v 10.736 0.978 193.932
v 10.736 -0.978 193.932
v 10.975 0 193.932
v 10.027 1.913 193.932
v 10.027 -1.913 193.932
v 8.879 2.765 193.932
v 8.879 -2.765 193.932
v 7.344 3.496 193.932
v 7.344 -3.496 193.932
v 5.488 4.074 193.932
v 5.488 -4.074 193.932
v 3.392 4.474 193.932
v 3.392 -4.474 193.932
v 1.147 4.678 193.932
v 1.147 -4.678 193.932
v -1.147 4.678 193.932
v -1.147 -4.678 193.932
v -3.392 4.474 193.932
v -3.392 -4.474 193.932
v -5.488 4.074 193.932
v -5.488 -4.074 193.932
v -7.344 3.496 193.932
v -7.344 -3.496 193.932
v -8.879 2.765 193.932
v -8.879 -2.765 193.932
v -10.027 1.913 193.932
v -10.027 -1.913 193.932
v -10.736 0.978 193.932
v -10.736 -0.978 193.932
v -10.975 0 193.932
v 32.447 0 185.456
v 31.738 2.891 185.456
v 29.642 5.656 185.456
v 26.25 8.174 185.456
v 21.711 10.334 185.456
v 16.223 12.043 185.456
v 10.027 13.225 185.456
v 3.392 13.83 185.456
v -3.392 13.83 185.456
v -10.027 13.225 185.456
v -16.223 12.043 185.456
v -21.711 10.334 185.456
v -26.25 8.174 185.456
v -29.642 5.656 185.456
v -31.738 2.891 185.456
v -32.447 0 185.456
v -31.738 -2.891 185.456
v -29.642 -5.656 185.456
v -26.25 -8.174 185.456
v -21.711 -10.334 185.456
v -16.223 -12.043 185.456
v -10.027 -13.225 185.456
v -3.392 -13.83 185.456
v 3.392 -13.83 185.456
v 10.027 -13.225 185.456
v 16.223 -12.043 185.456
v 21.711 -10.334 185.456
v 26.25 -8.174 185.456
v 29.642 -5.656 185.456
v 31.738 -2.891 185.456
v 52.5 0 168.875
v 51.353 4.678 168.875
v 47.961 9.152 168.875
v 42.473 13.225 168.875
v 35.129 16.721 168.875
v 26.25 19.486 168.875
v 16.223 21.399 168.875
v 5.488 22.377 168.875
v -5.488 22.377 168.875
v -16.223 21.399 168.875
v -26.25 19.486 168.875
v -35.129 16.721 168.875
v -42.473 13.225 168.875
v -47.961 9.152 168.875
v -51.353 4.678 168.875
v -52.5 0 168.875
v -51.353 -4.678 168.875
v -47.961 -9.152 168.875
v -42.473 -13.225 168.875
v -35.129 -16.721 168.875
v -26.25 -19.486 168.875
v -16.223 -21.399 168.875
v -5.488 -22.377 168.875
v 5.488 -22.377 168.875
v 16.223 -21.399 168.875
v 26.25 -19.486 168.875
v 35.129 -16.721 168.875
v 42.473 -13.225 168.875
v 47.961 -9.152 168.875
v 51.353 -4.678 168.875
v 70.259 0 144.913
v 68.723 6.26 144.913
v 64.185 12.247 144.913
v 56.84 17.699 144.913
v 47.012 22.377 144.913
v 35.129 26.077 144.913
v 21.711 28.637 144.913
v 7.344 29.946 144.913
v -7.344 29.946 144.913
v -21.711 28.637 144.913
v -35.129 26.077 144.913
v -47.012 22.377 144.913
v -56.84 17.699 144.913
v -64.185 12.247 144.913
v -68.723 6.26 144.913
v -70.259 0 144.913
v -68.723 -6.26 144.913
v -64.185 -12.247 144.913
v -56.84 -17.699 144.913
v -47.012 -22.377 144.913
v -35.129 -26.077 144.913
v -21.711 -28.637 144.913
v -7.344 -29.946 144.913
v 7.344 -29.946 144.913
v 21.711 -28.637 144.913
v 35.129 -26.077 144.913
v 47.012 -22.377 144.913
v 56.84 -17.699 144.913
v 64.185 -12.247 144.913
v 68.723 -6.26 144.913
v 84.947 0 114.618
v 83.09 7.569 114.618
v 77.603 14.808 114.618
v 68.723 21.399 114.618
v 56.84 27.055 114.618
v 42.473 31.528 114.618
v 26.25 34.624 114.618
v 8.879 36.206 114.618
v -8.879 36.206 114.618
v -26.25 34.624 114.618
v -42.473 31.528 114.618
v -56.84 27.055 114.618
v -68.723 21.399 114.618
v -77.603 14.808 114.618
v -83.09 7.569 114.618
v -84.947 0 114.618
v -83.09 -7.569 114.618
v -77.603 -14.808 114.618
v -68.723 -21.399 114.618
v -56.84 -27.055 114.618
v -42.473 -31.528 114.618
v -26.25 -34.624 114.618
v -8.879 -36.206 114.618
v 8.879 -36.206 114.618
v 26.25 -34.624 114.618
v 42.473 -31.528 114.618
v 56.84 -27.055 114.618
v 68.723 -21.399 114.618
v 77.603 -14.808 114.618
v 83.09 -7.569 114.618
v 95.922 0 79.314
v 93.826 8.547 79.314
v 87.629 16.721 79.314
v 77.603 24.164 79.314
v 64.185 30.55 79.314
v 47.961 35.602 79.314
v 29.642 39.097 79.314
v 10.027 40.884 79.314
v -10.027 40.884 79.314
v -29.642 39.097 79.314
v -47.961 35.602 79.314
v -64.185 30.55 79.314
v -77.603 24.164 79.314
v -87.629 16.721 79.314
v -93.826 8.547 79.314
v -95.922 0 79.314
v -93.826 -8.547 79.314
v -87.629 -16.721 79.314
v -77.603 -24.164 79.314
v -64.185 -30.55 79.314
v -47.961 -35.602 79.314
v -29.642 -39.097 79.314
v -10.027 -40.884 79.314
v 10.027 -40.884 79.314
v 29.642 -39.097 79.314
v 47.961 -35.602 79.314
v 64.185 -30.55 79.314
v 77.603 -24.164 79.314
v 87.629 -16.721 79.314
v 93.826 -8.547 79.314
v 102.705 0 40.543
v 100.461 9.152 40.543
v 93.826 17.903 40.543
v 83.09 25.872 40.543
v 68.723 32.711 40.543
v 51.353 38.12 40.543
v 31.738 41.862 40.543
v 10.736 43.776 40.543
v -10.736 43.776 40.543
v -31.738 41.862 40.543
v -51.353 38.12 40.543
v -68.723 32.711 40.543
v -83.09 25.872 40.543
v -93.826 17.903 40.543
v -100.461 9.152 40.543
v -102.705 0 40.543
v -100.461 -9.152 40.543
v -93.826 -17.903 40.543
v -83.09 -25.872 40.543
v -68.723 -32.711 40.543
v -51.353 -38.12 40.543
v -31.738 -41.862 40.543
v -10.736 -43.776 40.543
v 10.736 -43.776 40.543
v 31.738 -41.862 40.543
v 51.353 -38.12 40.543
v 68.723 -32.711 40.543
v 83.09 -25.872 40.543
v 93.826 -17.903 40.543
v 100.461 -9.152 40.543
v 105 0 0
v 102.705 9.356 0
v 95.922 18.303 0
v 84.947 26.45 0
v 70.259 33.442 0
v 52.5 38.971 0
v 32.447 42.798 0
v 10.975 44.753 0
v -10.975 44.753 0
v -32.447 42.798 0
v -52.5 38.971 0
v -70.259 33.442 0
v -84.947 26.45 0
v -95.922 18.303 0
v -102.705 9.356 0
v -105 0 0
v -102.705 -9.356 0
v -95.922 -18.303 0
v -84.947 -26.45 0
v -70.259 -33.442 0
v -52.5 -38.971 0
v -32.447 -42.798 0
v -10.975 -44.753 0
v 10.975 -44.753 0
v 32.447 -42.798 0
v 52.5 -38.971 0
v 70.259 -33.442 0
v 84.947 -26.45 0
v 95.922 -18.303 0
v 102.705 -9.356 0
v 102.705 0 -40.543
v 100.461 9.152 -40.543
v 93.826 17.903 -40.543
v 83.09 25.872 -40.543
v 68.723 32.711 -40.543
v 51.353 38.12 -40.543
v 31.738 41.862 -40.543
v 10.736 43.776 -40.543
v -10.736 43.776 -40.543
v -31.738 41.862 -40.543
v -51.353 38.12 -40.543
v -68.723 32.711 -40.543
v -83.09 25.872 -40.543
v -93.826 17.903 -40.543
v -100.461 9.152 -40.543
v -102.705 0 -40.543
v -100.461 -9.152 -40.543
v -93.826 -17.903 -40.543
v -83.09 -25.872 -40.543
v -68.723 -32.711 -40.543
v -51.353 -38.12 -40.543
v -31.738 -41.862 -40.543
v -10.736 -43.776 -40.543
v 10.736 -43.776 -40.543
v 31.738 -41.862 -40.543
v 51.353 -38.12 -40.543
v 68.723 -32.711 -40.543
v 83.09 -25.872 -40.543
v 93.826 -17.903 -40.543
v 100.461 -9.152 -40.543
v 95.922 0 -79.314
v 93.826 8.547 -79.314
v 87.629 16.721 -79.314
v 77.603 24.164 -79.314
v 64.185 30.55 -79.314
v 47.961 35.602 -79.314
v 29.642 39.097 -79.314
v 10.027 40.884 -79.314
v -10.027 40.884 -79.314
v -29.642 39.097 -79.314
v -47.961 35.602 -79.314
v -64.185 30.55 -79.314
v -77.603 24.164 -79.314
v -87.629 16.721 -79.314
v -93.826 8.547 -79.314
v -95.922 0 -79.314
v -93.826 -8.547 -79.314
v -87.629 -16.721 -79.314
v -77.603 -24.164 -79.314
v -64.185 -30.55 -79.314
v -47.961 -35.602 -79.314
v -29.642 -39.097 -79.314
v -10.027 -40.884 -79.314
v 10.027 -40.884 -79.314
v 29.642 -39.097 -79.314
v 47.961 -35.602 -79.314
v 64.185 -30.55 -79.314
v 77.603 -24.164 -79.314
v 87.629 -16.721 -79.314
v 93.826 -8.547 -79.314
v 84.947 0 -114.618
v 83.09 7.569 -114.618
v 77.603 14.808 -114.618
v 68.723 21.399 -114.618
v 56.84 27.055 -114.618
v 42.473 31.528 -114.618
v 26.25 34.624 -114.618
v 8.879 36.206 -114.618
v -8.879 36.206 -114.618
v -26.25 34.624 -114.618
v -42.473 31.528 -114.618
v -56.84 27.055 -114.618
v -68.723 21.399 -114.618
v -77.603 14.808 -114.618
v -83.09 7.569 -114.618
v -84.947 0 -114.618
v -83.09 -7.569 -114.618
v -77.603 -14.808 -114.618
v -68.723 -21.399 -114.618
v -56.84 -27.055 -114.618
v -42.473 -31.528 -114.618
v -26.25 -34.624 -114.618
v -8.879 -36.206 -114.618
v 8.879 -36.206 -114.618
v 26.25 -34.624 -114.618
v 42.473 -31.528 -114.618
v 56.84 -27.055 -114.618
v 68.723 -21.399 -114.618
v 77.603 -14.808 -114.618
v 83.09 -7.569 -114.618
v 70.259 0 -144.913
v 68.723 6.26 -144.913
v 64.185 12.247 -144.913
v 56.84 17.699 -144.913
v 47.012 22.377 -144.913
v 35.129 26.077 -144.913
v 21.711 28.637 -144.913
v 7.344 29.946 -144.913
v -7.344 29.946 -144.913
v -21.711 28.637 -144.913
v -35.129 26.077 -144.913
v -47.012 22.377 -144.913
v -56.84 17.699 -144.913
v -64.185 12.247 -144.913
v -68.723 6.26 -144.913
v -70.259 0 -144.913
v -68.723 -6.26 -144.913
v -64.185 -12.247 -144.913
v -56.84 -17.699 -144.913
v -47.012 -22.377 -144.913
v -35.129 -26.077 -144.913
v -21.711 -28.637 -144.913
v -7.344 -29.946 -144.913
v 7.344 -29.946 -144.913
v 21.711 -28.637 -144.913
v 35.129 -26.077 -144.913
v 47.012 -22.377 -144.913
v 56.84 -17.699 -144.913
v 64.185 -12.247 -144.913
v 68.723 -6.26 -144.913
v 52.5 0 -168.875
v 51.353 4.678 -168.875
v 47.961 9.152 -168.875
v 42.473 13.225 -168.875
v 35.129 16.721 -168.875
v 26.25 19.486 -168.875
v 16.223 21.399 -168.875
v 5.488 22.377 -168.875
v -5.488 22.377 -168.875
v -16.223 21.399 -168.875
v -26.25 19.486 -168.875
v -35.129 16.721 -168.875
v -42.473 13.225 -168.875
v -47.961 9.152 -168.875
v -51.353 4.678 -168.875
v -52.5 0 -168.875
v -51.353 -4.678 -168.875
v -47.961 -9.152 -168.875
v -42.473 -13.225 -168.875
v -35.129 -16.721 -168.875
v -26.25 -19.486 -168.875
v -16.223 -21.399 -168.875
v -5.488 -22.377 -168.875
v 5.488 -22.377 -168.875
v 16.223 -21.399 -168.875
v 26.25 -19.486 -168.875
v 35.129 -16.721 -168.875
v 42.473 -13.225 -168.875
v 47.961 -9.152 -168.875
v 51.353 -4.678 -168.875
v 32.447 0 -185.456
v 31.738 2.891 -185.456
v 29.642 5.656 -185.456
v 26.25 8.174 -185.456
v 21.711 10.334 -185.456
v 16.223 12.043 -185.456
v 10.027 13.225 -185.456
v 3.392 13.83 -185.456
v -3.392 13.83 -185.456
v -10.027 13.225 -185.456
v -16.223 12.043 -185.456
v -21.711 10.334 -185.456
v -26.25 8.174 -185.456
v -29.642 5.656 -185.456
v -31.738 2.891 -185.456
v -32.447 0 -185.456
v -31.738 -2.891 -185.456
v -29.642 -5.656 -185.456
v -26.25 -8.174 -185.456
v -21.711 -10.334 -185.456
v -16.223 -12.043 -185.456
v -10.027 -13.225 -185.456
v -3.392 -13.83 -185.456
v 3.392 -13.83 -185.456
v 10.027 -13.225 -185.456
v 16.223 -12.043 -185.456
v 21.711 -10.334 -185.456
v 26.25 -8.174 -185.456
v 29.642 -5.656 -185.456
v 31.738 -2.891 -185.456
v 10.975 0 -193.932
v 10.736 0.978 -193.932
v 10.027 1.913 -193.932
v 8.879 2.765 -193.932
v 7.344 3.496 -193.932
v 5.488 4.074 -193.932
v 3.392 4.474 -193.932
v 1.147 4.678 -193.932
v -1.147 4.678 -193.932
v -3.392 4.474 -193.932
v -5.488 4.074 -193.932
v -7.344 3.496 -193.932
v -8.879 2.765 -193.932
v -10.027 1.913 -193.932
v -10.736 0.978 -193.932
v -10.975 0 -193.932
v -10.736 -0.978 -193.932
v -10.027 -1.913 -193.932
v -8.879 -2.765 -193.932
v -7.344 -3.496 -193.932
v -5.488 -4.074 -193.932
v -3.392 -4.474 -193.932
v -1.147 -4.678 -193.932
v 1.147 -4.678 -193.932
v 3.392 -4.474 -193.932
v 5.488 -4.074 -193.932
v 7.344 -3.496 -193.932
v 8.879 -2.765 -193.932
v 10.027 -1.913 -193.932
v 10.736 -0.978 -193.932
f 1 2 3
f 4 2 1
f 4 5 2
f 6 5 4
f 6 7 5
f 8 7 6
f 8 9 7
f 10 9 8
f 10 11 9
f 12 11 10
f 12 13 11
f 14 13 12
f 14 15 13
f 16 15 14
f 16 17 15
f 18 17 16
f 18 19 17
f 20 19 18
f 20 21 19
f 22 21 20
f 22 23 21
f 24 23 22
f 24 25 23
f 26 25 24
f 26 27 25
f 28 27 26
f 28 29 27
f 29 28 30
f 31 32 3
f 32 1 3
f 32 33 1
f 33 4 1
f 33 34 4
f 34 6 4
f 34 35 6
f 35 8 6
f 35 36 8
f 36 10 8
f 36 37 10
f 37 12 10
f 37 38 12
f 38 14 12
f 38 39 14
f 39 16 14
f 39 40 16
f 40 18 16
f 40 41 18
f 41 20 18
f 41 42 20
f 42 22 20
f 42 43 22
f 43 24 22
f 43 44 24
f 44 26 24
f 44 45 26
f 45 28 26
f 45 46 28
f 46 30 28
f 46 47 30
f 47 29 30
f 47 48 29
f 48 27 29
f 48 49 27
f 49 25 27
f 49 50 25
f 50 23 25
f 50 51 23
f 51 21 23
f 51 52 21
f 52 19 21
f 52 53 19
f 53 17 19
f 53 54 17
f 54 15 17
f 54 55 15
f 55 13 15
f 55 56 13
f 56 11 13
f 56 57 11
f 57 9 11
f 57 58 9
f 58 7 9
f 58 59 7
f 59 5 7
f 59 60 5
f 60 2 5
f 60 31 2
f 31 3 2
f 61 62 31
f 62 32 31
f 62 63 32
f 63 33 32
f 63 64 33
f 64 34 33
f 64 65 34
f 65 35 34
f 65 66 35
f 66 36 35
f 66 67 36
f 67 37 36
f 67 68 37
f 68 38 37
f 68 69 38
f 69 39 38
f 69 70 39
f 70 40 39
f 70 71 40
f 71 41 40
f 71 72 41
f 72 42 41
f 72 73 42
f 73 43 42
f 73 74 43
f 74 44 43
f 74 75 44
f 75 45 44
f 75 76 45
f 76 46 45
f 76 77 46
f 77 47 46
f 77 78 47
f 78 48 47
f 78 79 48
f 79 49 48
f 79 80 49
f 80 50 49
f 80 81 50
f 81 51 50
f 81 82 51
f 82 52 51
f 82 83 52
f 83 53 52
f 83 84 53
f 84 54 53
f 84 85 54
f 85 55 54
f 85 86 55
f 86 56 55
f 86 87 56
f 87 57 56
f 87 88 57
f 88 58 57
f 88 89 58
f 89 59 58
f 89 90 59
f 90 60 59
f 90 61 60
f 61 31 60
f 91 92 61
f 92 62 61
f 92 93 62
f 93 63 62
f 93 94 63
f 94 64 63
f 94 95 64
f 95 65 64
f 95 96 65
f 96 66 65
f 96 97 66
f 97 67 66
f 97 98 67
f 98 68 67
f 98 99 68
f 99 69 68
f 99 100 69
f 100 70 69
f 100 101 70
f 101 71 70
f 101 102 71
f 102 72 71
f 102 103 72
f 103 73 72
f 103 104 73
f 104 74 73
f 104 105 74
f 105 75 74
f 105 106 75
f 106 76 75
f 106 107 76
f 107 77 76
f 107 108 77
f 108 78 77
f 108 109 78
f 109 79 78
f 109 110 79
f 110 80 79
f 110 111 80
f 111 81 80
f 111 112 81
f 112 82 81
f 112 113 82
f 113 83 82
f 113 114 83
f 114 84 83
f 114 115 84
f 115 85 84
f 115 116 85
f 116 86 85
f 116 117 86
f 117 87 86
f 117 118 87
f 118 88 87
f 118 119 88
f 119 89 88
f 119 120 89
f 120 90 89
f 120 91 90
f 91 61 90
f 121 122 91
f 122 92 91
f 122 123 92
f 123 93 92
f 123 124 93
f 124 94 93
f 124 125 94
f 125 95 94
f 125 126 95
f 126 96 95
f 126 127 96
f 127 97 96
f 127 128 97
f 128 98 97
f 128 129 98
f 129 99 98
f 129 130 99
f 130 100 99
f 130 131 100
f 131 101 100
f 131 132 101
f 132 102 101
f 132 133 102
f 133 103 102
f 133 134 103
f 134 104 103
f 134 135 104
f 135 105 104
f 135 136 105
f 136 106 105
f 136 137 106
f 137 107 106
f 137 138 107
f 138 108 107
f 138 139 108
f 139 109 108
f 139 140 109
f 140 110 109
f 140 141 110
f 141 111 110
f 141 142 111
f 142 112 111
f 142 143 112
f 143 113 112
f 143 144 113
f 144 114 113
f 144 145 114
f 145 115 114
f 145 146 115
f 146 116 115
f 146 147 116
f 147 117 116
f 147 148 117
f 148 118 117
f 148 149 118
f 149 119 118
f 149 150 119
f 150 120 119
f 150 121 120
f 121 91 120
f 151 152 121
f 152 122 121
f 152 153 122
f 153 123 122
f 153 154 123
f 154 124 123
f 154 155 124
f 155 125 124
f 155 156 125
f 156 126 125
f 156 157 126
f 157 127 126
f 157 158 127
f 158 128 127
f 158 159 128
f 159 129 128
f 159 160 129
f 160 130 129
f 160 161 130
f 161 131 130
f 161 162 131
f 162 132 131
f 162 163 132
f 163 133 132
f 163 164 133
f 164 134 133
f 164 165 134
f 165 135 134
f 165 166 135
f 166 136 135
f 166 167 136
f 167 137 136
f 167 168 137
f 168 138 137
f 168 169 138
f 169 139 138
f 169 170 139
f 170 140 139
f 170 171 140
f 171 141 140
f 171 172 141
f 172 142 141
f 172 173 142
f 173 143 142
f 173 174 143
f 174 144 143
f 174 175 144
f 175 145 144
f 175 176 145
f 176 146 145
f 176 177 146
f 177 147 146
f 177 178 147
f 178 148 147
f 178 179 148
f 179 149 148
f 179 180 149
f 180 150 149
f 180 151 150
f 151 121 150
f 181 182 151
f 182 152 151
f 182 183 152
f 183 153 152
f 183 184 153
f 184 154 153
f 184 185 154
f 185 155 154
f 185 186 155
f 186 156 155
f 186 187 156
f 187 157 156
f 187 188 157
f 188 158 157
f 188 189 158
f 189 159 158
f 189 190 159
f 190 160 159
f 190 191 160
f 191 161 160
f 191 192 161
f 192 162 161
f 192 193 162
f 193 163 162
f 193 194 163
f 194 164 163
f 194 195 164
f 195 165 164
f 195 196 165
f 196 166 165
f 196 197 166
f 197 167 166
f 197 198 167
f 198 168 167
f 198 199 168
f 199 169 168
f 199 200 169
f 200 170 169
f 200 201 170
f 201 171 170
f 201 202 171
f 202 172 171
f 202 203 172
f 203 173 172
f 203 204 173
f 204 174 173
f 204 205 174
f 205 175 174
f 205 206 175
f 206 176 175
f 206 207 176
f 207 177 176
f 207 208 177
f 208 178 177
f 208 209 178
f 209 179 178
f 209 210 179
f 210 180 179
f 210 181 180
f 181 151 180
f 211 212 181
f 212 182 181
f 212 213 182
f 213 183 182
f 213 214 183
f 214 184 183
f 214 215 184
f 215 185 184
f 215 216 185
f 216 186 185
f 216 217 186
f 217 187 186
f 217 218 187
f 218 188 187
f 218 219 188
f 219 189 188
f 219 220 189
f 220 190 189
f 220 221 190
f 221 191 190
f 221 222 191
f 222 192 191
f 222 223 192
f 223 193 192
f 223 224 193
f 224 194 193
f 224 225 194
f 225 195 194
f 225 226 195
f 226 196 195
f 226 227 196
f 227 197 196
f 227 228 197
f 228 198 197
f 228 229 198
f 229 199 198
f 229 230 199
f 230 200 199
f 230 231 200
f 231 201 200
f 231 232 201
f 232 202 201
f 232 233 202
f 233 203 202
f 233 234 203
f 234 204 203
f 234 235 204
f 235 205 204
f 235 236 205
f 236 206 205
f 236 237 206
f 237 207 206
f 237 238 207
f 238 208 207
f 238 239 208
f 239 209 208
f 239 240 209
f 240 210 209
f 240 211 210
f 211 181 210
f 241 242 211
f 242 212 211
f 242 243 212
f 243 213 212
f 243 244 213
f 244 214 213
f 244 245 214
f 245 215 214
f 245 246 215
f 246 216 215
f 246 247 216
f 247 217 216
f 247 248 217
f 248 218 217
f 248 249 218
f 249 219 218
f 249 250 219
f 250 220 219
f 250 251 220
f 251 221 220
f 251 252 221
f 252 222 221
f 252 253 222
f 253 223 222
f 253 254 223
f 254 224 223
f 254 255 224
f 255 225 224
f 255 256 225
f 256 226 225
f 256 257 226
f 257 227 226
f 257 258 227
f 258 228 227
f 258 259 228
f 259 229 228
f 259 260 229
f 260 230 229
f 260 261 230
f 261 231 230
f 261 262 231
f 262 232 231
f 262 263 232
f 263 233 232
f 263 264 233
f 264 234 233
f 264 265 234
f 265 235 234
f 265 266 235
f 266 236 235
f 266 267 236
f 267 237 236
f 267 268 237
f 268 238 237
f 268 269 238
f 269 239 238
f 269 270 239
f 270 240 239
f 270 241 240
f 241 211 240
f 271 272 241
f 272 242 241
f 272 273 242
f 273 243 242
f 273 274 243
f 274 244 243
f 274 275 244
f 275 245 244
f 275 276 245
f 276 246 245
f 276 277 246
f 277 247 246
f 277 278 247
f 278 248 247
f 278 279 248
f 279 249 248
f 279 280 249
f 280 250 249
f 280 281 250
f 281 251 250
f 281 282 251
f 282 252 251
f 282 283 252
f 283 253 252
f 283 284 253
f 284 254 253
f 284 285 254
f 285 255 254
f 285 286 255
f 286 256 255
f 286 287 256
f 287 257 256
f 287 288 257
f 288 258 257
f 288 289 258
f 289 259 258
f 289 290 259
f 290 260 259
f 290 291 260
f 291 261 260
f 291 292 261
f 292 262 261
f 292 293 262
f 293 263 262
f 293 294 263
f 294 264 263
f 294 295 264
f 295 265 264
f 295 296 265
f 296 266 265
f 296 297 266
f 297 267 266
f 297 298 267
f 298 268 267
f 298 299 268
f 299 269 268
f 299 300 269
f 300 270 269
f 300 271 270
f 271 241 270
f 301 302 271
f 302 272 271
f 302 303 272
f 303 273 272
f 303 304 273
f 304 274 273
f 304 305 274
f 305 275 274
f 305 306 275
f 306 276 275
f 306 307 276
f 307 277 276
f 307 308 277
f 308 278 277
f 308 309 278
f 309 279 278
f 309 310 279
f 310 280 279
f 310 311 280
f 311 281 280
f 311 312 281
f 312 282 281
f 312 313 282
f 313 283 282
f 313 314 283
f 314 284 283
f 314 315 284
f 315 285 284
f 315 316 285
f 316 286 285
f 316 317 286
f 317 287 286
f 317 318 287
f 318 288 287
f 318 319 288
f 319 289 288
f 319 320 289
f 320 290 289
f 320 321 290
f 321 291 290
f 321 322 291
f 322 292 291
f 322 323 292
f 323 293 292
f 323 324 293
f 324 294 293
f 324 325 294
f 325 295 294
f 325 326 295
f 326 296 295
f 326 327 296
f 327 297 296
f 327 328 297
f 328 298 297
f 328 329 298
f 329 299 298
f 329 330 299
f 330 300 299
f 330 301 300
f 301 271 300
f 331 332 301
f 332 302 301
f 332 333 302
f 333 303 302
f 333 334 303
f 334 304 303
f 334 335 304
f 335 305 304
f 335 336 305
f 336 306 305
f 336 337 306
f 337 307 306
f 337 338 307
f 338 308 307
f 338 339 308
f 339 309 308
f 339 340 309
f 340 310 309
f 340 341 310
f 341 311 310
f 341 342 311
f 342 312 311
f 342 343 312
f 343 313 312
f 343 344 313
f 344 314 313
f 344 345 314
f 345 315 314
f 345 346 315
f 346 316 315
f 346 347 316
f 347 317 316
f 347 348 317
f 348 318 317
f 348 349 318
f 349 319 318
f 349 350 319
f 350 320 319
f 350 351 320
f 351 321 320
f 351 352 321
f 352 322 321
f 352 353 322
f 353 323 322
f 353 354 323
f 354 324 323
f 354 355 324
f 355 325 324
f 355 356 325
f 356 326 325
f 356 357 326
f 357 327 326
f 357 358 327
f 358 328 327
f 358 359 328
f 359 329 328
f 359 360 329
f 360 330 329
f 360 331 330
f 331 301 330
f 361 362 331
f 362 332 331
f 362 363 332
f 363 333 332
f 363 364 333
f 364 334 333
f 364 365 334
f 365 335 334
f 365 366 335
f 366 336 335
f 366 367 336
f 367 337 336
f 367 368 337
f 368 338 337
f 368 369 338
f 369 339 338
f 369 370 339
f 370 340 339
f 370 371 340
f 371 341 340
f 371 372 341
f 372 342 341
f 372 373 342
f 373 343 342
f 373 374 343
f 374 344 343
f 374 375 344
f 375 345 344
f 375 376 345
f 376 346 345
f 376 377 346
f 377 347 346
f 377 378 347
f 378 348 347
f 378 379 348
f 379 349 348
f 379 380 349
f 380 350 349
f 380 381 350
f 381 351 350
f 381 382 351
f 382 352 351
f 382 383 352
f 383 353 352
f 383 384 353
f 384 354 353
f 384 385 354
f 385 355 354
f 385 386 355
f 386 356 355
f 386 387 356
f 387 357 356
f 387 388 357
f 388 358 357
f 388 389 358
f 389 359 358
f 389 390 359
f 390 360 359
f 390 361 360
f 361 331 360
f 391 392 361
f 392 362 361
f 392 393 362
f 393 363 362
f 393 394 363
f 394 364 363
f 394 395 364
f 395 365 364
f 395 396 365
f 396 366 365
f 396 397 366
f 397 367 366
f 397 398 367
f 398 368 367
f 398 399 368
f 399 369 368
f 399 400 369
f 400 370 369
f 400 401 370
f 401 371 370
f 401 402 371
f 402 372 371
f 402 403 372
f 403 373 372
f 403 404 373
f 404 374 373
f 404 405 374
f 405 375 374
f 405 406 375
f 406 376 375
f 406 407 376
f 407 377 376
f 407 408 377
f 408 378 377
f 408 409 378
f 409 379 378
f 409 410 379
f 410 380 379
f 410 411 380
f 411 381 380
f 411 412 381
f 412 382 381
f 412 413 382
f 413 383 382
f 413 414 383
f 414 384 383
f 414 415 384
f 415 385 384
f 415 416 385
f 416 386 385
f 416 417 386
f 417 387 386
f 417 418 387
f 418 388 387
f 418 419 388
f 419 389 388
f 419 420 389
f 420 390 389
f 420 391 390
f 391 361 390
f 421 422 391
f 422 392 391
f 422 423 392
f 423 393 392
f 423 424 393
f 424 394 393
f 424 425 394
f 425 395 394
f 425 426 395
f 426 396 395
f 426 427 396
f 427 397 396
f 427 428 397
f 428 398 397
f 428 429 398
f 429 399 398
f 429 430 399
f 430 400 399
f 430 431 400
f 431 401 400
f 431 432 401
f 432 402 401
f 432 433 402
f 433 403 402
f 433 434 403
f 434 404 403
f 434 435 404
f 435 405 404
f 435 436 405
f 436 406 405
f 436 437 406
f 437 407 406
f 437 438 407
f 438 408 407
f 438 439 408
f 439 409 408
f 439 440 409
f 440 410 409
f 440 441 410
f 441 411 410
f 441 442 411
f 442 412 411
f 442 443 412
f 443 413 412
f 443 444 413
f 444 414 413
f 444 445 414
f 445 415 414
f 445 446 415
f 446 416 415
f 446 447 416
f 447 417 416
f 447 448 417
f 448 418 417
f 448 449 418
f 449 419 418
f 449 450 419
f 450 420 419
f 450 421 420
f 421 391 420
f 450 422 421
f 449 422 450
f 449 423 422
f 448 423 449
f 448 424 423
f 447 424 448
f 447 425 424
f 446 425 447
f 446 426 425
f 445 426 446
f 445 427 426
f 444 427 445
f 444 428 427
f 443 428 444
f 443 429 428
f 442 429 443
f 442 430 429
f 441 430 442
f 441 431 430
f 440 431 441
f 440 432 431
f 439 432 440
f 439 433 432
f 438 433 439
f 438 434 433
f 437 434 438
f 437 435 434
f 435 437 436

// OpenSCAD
// Generated by SolidPython 1.0.1 on 2020-07-29 00:46:47


scale(v = [7, 3, 13]) {
	sphere(r = 15);
}
/***********************************************
*********      SolidPython code:      **********
************************************************
 
# import packages: SolidPython
from solid import *
from solid.utils import *
from itertools import chain, combinations, permutations


class Resize:

    def __init__(self, scad_file):
        self.scad_file = scad_file
        #self.scad_file = import_scad(scad_file)
        # cone/cylinder param:
        self.r1 = 0
        self.r2 = 0
        self.h = 0
        # rectangular prism param:
        self.w = 0
        self.l = 0
        # ellipse param:
        self.r = 0

    # import OpenScad code (file name corresponds to shape)


    # classify shape + parameters
    def assign(self, param1, param2, param3):
        if self.scad_file == 'cone.scad':
            self.r1 = param1
            self.r2 = param2
            self.h = param3
        elif self.scad_file == 'cylinder.scad':
            self.r1 = param1
            self.r2 = param2
            self.h = param3
        elif self.scad_file == 'rectangularPrism.scad':
            self.h = param1
            self.l = param2
            self.w = param3
        else:
            self.r = param1
            self.h = param2

    # resize parameters
    def iterate(self):
        x = range(3, 20, 2)
        i = 1
        if self.scad_file == 'cone.scad':
            tempList = list(permutations(x, 2))
            for temp in tempList:
                param1 = temp[0]
                param2 = temp[1]
                filepath = 'produced_scad_files/' + 'cone' + str(param1) + '_' + str(param2) + '_' + '.scad'
                scad_render_to_file(cylinder(h=param1, r1=param2, r2=0), filepath)

        elif self.scad_file == 'cylinder.scad':
            tempList = list(permutations(x, 3))
            for temp in tempList:
                param1 = temp[0]
                param2 = temp[1]
                filepath = 'produced_scad_files/' + 'cylinder' + str(param1) + '_' + str(param2) + '_' + '.scad'
                scad_render_to_file(cylinder(h=param1, r1=param2, r2=param2), filepath)

        elif self.scad_file == 'rectangularPrism.scad':
            tempList = list(permutations(x, 3))
            for temp in tempList:
                param1 = temp[0]
                param2 = temp[1]
                param3 = temp[2]
                filepath = 'produced_scad_files/' + 'rectangularPrism' + str(param1) + '_' + str(param2) + '_' + str(
                    param3) + '.scad'
                scad_render_to_file(cube(size=(param1, param2, param3)), filepath)

        elif self.scad_file == 'ellipse.scad':
            tempList = list(permutations(x, 4))
            for temp in tempList:
                param1 = temp[0]
                param2 = temp[1]
                param3 = temp[2]
                param4 = temp[3]
                filepath = 'produced_scad_files/' + 'ellipse' + str(param1) + '_' + str(param2) + '_' + str(param3) + '_' + str(param4) + '.scad'
                scad_render_to_file(scale([param1, param2, param3])(sphere(r=param4)), filepath)

    def render_to_scadfile(self):
        scad_render_to_file(scad, 'example.scad') 
 
************************************************/
